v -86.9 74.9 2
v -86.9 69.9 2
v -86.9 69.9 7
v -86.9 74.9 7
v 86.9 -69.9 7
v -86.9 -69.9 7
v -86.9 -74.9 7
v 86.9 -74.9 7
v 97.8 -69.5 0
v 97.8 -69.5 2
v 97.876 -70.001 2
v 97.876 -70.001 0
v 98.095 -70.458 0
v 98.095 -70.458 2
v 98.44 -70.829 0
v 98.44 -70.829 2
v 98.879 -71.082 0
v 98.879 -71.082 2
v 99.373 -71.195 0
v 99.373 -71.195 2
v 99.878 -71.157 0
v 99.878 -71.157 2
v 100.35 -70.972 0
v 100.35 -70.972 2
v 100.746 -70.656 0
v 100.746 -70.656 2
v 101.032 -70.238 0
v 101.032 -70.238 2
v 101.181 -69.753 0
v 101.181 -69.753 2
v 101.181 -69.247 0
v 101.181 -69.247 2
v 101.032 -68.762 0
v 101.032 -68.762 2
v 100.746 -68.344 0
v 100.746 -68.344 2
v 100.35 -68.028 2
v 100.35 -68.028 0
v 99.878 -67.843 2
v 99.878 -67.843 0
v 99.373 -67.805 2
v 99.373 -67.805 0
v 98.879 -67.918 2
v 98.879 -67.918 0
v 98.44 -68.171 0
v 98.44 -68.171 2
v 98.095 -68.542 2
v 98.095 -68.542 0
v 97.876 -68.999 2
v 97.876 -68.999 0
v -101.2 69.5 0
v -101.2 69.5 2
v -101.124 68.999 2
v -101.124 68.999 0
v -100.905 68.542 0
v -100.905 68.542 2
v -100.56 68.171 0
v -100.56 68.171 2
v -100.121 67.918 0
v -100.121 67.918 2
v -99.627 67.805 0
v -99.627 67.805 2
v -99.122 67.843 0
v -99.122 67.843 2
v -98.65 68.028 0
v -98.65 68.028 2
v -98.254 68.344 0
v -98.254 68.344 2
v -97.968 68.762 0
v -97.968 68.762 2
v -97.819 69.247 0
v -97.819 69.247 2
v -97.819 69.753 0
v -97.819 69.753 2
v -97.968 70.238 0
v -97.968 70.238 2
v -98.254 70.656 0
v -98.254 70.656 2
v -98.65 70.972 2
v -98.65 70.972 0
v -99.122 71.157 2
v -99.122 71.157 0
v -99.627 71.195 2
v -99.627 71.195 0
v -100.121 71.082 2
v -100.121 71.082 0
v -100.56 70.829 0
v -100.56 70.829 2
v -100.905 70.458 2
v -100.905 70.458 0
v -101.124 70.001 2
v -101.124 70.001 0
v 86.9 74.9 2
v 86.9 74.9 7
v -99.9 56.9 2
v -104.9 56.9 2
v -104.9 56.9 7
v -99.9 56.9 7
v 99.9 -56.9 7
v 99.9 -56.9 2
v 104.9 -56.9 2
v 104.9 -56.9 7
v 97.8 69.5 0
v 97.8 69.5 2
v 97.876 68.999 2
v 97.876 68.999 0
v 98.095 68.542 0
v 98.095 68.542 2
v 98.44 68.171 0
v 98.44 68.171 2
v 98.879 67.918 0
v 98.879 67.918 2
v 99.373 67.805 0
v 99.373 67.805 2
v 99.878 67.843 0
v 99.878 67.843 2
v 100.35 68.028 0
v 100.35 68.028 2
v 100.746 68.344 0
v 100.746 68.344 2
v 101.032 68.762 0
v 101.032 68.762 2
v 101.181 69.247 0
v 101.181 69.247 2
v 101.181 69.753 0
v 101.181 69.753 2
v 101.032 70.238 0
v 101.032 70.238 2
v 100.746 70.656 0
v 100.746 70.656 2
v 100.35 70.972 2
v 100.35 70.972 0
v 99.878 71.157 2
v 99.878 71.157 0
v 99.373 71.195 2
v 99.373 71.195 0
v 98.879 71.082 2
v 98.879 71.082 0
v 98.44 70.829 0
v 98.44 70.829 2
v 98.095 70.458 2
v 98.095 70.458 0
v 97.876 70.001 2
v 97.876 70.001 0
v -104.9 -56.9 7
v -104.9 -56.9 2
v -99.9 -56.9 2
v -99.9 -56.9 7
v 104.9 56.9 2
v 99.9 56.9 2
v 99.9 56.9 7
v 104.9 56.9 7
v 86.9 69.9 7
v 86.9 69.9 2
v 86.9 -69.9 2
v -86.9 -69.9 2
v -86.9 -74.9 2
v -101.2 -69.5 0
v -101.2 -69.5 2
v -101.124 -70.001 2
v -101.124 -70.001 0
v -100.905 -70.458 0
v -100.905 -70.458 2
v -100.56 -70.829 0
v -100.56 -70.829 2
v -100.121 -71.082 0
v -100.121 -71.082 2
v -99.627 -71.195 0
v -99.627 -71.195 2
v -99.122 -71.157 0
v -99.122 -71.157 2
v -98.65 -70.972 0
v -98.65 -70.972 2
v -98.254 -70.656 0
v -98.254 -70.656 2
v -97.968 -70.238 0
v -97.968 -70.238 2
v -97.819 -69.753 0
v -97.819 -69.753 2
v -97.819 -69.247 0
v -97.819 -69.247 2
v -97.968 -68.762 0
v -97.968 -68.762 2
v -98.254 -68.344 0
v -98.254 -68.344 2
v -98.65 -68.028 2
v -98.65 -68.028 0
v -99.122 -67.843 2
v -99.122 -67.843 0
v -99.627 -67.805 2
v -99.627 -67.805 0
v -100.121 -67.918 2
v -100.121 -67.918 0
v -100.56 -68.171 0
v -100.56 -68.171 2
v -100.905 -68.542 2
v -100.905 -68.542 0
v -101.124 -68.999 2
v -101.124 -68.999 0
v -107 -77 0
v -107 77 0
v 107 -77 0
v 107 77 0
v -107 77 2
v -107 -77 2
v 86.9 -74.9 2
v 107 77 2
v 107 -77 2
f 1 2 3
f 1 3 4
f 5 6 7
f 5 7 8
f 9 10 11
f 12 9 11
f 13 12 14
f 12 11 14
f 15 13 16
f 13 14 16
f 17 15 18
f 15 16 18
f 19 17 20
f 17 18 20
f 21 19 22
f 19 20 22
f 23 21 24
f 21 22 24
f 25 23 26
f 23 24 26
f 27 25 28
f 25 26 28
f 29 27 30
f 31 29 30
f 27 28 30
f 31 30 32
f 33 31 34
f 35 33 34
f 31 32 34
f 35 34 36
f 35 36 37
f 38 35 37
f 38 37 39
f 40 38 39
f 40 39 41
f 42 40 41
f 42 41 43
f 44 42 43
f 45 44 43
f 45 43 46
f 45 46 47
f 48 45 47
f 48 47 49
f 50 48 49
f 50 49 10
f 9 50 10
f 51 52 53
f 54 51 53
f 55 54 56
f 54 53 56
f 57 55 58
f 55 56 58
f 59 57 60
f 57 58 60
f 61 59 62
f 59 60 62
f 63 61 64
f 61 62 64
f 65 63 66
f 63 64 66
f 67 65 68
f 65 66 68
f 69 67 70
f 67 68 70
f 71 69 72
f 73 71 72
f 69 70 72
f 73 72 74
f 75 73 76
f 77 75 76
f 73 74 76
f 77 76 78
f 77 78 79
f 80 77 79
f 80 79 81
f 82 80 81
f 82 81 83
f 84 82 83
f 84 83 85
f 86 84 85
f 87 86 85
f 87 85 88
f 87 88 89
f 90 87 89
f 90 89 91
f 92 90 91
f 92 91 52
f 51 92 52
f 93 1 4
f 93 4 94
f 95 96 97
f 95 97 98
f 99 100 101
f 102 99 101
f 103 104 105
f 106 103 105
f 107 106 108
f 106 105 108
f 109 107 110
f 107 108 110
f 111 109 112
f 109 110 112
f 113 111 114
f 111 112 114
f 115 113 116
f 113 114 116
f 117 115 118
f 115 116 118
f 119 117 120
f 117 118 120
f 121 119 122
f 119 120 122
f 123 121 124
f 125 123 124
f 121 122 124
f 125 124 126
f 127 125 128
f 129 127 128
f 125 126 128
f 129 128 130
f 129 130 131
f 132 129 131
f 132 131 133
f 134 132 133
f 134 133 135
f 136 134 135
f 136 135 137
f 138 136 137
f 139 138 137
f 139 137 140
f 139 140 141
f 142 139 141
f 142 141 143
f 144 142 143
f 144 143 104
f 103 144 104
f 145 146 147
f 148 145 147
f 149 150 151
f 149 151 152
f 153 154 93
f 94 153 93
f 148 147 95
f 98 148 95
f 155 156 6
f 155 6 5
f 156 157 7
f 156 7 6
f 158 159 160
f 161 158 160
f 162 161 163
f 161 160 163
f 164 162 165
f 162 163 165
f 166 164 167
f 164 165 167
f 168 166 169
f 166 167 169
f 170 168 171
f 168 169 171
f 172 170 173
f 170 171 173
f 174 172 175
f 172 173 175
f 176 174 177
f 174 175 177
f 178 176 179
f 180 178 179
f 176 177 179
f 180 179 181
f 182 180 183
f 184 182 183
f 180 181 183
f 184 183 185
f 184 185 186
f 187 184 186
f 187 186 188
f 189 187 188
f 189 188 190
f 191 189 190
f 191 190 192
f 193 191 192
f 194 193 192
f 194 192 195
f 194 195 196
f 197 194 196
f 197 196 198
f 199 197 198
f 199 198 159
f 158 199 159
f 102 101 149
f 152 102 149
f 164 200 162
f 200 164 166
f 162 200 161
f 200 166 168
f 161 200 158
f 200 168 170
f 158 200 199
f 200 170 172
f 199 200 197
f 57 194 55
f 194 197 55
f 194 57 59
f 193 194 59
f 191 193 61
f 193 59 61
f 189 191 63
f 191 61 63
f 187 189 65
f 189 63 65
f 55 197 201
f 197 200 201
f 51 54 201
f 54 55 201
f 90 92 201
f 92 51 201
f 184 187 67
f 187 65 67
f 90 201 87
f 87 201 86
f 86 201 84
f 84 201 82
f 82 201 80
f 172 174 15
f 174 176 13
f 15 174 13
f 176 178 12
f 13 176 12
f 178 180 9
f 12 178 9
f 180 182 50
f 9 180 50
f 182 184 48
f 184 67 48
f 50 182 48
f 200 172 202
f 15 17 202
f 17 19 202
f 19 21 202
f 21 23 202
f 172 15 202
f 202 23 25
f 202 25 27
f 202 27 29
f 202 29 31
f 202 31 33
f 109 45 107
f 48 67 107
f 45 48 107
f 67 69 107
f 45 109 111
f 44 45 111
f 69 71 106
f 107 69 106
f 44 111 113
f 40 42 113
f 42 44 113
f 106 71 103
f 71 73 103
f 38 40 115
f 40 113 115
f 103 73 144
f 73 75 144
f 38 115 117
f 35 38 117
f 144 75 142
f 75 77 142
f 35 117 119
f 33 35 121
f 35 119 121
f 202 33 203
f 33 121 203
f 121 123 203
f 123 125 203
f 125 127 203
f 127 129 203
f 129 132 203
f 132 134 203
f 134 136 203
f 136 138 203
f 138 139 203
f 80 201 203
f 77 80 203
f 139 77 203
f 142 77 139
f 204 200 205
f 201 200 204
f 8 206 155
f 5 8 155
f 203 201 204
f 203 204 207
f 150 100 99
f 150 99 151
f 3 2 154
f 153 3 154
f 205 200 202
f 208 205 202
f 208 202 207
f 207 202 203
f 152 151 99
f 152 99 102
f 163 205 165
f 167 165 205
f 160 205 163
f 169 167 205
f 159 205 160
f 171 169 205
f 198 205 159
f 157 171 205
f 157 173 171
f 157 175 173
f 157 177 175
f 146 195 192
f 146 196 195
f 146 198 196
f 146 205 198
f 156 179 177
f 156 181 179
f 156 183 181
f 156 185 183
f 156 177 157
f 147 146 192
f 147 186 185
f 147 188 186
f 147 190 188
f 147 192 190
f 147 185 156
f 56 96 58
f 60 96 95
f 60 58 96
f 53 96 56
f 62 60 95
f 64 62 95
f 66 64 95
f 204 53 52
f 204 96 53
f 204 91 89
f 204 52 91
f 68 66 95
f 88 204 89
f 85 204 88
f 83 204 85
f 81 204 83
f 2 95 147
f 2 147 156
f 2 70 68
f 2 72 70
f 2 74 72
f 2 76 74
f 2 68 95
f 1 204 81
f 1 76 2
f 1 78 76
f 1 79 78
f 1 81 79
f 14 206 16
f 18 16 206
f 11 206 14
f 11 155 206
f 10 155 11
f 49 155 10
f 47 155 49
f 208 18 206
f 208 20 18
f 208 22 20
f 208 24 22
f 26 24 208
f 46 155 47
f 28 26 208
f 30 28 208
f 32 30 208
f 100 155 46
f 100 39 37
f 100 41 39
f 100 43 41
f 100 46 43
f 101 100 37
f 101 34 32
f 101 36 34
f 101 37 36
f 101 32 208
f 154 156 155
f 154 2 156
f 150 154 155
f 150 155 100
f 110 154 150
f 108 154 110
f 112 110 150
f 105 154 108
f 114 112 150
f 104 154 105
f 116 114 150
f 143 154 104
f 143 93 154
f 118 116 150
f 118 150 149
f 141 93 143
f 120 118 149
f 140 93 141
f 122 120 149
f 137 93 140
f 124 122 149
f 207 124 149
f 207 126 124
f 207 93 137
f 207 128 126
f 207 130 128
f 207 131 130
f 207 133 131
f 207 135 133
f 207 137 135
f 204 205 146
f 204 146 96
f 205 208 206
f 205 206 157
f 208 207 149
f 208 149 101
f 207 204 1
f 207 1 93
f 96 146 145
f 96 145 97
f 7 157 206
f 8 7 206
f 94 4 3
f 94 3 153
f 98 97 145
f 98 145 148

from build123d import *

# Parameters (mm, degrees)
F0_W     = 214
F0_H     = 154
F1_DEPTH = 2
F2_W     = 5
F2_H     = 113.8
F2_W_2   = 173.8
F2_H_2   = 5
F3_DEPTH = 5
F5_D     = 3.4
F5_DEPTH = 5
F5_TIP   = 1.0214630523


# Not quite as in the source:
# - a feature names something its author has since deleted; it is built from what else it names


with BuildPart() as f1:
    # F0 (on Top) → F1 (new body)
    with BuildSketch(Plane.XY):
        Rectangle(F0_W, F0_H)
    extrude(amount=F1_DEPTH)

    # F2 (on face) → F3 (join)
    with BuildSketch(Plane.XY.offset(2)):
        with Locations((-102.4, 0)):
            Rectangle(F2_W, F2_H)
        with Locations((0, 72.4)):
            Rectangle(F2_W_2, F2_H_2)
        with Locations((102.4, 0)):
            Rectangle(F2_W, F2_H)
        with Locations((0, -72.4)):
            Rectangle(F2_W_2, F2_H_2)
    extrude(amount=F3_DEPTH)

    # F5
    with Locations(Plane(origin=(0, 0, 0), x_dir=(1, 0, 0), z_dir=(0, 0, -1))):
        with Locations((-99.5, -69.5), (-99.5, 69.5), (99.5, 69.5), (99.5, -69.5)):
            Hole(F5_D / 2, depth=F5_DEPTH)
            with Locations((0, 0, -(F5_DEPTH + F5_TIP / 2))):  # 118° drill point
                Cone(0, F5_D / 2, F5_TIP, mode=Mode.SUBTRACT)


solid = f1.part
